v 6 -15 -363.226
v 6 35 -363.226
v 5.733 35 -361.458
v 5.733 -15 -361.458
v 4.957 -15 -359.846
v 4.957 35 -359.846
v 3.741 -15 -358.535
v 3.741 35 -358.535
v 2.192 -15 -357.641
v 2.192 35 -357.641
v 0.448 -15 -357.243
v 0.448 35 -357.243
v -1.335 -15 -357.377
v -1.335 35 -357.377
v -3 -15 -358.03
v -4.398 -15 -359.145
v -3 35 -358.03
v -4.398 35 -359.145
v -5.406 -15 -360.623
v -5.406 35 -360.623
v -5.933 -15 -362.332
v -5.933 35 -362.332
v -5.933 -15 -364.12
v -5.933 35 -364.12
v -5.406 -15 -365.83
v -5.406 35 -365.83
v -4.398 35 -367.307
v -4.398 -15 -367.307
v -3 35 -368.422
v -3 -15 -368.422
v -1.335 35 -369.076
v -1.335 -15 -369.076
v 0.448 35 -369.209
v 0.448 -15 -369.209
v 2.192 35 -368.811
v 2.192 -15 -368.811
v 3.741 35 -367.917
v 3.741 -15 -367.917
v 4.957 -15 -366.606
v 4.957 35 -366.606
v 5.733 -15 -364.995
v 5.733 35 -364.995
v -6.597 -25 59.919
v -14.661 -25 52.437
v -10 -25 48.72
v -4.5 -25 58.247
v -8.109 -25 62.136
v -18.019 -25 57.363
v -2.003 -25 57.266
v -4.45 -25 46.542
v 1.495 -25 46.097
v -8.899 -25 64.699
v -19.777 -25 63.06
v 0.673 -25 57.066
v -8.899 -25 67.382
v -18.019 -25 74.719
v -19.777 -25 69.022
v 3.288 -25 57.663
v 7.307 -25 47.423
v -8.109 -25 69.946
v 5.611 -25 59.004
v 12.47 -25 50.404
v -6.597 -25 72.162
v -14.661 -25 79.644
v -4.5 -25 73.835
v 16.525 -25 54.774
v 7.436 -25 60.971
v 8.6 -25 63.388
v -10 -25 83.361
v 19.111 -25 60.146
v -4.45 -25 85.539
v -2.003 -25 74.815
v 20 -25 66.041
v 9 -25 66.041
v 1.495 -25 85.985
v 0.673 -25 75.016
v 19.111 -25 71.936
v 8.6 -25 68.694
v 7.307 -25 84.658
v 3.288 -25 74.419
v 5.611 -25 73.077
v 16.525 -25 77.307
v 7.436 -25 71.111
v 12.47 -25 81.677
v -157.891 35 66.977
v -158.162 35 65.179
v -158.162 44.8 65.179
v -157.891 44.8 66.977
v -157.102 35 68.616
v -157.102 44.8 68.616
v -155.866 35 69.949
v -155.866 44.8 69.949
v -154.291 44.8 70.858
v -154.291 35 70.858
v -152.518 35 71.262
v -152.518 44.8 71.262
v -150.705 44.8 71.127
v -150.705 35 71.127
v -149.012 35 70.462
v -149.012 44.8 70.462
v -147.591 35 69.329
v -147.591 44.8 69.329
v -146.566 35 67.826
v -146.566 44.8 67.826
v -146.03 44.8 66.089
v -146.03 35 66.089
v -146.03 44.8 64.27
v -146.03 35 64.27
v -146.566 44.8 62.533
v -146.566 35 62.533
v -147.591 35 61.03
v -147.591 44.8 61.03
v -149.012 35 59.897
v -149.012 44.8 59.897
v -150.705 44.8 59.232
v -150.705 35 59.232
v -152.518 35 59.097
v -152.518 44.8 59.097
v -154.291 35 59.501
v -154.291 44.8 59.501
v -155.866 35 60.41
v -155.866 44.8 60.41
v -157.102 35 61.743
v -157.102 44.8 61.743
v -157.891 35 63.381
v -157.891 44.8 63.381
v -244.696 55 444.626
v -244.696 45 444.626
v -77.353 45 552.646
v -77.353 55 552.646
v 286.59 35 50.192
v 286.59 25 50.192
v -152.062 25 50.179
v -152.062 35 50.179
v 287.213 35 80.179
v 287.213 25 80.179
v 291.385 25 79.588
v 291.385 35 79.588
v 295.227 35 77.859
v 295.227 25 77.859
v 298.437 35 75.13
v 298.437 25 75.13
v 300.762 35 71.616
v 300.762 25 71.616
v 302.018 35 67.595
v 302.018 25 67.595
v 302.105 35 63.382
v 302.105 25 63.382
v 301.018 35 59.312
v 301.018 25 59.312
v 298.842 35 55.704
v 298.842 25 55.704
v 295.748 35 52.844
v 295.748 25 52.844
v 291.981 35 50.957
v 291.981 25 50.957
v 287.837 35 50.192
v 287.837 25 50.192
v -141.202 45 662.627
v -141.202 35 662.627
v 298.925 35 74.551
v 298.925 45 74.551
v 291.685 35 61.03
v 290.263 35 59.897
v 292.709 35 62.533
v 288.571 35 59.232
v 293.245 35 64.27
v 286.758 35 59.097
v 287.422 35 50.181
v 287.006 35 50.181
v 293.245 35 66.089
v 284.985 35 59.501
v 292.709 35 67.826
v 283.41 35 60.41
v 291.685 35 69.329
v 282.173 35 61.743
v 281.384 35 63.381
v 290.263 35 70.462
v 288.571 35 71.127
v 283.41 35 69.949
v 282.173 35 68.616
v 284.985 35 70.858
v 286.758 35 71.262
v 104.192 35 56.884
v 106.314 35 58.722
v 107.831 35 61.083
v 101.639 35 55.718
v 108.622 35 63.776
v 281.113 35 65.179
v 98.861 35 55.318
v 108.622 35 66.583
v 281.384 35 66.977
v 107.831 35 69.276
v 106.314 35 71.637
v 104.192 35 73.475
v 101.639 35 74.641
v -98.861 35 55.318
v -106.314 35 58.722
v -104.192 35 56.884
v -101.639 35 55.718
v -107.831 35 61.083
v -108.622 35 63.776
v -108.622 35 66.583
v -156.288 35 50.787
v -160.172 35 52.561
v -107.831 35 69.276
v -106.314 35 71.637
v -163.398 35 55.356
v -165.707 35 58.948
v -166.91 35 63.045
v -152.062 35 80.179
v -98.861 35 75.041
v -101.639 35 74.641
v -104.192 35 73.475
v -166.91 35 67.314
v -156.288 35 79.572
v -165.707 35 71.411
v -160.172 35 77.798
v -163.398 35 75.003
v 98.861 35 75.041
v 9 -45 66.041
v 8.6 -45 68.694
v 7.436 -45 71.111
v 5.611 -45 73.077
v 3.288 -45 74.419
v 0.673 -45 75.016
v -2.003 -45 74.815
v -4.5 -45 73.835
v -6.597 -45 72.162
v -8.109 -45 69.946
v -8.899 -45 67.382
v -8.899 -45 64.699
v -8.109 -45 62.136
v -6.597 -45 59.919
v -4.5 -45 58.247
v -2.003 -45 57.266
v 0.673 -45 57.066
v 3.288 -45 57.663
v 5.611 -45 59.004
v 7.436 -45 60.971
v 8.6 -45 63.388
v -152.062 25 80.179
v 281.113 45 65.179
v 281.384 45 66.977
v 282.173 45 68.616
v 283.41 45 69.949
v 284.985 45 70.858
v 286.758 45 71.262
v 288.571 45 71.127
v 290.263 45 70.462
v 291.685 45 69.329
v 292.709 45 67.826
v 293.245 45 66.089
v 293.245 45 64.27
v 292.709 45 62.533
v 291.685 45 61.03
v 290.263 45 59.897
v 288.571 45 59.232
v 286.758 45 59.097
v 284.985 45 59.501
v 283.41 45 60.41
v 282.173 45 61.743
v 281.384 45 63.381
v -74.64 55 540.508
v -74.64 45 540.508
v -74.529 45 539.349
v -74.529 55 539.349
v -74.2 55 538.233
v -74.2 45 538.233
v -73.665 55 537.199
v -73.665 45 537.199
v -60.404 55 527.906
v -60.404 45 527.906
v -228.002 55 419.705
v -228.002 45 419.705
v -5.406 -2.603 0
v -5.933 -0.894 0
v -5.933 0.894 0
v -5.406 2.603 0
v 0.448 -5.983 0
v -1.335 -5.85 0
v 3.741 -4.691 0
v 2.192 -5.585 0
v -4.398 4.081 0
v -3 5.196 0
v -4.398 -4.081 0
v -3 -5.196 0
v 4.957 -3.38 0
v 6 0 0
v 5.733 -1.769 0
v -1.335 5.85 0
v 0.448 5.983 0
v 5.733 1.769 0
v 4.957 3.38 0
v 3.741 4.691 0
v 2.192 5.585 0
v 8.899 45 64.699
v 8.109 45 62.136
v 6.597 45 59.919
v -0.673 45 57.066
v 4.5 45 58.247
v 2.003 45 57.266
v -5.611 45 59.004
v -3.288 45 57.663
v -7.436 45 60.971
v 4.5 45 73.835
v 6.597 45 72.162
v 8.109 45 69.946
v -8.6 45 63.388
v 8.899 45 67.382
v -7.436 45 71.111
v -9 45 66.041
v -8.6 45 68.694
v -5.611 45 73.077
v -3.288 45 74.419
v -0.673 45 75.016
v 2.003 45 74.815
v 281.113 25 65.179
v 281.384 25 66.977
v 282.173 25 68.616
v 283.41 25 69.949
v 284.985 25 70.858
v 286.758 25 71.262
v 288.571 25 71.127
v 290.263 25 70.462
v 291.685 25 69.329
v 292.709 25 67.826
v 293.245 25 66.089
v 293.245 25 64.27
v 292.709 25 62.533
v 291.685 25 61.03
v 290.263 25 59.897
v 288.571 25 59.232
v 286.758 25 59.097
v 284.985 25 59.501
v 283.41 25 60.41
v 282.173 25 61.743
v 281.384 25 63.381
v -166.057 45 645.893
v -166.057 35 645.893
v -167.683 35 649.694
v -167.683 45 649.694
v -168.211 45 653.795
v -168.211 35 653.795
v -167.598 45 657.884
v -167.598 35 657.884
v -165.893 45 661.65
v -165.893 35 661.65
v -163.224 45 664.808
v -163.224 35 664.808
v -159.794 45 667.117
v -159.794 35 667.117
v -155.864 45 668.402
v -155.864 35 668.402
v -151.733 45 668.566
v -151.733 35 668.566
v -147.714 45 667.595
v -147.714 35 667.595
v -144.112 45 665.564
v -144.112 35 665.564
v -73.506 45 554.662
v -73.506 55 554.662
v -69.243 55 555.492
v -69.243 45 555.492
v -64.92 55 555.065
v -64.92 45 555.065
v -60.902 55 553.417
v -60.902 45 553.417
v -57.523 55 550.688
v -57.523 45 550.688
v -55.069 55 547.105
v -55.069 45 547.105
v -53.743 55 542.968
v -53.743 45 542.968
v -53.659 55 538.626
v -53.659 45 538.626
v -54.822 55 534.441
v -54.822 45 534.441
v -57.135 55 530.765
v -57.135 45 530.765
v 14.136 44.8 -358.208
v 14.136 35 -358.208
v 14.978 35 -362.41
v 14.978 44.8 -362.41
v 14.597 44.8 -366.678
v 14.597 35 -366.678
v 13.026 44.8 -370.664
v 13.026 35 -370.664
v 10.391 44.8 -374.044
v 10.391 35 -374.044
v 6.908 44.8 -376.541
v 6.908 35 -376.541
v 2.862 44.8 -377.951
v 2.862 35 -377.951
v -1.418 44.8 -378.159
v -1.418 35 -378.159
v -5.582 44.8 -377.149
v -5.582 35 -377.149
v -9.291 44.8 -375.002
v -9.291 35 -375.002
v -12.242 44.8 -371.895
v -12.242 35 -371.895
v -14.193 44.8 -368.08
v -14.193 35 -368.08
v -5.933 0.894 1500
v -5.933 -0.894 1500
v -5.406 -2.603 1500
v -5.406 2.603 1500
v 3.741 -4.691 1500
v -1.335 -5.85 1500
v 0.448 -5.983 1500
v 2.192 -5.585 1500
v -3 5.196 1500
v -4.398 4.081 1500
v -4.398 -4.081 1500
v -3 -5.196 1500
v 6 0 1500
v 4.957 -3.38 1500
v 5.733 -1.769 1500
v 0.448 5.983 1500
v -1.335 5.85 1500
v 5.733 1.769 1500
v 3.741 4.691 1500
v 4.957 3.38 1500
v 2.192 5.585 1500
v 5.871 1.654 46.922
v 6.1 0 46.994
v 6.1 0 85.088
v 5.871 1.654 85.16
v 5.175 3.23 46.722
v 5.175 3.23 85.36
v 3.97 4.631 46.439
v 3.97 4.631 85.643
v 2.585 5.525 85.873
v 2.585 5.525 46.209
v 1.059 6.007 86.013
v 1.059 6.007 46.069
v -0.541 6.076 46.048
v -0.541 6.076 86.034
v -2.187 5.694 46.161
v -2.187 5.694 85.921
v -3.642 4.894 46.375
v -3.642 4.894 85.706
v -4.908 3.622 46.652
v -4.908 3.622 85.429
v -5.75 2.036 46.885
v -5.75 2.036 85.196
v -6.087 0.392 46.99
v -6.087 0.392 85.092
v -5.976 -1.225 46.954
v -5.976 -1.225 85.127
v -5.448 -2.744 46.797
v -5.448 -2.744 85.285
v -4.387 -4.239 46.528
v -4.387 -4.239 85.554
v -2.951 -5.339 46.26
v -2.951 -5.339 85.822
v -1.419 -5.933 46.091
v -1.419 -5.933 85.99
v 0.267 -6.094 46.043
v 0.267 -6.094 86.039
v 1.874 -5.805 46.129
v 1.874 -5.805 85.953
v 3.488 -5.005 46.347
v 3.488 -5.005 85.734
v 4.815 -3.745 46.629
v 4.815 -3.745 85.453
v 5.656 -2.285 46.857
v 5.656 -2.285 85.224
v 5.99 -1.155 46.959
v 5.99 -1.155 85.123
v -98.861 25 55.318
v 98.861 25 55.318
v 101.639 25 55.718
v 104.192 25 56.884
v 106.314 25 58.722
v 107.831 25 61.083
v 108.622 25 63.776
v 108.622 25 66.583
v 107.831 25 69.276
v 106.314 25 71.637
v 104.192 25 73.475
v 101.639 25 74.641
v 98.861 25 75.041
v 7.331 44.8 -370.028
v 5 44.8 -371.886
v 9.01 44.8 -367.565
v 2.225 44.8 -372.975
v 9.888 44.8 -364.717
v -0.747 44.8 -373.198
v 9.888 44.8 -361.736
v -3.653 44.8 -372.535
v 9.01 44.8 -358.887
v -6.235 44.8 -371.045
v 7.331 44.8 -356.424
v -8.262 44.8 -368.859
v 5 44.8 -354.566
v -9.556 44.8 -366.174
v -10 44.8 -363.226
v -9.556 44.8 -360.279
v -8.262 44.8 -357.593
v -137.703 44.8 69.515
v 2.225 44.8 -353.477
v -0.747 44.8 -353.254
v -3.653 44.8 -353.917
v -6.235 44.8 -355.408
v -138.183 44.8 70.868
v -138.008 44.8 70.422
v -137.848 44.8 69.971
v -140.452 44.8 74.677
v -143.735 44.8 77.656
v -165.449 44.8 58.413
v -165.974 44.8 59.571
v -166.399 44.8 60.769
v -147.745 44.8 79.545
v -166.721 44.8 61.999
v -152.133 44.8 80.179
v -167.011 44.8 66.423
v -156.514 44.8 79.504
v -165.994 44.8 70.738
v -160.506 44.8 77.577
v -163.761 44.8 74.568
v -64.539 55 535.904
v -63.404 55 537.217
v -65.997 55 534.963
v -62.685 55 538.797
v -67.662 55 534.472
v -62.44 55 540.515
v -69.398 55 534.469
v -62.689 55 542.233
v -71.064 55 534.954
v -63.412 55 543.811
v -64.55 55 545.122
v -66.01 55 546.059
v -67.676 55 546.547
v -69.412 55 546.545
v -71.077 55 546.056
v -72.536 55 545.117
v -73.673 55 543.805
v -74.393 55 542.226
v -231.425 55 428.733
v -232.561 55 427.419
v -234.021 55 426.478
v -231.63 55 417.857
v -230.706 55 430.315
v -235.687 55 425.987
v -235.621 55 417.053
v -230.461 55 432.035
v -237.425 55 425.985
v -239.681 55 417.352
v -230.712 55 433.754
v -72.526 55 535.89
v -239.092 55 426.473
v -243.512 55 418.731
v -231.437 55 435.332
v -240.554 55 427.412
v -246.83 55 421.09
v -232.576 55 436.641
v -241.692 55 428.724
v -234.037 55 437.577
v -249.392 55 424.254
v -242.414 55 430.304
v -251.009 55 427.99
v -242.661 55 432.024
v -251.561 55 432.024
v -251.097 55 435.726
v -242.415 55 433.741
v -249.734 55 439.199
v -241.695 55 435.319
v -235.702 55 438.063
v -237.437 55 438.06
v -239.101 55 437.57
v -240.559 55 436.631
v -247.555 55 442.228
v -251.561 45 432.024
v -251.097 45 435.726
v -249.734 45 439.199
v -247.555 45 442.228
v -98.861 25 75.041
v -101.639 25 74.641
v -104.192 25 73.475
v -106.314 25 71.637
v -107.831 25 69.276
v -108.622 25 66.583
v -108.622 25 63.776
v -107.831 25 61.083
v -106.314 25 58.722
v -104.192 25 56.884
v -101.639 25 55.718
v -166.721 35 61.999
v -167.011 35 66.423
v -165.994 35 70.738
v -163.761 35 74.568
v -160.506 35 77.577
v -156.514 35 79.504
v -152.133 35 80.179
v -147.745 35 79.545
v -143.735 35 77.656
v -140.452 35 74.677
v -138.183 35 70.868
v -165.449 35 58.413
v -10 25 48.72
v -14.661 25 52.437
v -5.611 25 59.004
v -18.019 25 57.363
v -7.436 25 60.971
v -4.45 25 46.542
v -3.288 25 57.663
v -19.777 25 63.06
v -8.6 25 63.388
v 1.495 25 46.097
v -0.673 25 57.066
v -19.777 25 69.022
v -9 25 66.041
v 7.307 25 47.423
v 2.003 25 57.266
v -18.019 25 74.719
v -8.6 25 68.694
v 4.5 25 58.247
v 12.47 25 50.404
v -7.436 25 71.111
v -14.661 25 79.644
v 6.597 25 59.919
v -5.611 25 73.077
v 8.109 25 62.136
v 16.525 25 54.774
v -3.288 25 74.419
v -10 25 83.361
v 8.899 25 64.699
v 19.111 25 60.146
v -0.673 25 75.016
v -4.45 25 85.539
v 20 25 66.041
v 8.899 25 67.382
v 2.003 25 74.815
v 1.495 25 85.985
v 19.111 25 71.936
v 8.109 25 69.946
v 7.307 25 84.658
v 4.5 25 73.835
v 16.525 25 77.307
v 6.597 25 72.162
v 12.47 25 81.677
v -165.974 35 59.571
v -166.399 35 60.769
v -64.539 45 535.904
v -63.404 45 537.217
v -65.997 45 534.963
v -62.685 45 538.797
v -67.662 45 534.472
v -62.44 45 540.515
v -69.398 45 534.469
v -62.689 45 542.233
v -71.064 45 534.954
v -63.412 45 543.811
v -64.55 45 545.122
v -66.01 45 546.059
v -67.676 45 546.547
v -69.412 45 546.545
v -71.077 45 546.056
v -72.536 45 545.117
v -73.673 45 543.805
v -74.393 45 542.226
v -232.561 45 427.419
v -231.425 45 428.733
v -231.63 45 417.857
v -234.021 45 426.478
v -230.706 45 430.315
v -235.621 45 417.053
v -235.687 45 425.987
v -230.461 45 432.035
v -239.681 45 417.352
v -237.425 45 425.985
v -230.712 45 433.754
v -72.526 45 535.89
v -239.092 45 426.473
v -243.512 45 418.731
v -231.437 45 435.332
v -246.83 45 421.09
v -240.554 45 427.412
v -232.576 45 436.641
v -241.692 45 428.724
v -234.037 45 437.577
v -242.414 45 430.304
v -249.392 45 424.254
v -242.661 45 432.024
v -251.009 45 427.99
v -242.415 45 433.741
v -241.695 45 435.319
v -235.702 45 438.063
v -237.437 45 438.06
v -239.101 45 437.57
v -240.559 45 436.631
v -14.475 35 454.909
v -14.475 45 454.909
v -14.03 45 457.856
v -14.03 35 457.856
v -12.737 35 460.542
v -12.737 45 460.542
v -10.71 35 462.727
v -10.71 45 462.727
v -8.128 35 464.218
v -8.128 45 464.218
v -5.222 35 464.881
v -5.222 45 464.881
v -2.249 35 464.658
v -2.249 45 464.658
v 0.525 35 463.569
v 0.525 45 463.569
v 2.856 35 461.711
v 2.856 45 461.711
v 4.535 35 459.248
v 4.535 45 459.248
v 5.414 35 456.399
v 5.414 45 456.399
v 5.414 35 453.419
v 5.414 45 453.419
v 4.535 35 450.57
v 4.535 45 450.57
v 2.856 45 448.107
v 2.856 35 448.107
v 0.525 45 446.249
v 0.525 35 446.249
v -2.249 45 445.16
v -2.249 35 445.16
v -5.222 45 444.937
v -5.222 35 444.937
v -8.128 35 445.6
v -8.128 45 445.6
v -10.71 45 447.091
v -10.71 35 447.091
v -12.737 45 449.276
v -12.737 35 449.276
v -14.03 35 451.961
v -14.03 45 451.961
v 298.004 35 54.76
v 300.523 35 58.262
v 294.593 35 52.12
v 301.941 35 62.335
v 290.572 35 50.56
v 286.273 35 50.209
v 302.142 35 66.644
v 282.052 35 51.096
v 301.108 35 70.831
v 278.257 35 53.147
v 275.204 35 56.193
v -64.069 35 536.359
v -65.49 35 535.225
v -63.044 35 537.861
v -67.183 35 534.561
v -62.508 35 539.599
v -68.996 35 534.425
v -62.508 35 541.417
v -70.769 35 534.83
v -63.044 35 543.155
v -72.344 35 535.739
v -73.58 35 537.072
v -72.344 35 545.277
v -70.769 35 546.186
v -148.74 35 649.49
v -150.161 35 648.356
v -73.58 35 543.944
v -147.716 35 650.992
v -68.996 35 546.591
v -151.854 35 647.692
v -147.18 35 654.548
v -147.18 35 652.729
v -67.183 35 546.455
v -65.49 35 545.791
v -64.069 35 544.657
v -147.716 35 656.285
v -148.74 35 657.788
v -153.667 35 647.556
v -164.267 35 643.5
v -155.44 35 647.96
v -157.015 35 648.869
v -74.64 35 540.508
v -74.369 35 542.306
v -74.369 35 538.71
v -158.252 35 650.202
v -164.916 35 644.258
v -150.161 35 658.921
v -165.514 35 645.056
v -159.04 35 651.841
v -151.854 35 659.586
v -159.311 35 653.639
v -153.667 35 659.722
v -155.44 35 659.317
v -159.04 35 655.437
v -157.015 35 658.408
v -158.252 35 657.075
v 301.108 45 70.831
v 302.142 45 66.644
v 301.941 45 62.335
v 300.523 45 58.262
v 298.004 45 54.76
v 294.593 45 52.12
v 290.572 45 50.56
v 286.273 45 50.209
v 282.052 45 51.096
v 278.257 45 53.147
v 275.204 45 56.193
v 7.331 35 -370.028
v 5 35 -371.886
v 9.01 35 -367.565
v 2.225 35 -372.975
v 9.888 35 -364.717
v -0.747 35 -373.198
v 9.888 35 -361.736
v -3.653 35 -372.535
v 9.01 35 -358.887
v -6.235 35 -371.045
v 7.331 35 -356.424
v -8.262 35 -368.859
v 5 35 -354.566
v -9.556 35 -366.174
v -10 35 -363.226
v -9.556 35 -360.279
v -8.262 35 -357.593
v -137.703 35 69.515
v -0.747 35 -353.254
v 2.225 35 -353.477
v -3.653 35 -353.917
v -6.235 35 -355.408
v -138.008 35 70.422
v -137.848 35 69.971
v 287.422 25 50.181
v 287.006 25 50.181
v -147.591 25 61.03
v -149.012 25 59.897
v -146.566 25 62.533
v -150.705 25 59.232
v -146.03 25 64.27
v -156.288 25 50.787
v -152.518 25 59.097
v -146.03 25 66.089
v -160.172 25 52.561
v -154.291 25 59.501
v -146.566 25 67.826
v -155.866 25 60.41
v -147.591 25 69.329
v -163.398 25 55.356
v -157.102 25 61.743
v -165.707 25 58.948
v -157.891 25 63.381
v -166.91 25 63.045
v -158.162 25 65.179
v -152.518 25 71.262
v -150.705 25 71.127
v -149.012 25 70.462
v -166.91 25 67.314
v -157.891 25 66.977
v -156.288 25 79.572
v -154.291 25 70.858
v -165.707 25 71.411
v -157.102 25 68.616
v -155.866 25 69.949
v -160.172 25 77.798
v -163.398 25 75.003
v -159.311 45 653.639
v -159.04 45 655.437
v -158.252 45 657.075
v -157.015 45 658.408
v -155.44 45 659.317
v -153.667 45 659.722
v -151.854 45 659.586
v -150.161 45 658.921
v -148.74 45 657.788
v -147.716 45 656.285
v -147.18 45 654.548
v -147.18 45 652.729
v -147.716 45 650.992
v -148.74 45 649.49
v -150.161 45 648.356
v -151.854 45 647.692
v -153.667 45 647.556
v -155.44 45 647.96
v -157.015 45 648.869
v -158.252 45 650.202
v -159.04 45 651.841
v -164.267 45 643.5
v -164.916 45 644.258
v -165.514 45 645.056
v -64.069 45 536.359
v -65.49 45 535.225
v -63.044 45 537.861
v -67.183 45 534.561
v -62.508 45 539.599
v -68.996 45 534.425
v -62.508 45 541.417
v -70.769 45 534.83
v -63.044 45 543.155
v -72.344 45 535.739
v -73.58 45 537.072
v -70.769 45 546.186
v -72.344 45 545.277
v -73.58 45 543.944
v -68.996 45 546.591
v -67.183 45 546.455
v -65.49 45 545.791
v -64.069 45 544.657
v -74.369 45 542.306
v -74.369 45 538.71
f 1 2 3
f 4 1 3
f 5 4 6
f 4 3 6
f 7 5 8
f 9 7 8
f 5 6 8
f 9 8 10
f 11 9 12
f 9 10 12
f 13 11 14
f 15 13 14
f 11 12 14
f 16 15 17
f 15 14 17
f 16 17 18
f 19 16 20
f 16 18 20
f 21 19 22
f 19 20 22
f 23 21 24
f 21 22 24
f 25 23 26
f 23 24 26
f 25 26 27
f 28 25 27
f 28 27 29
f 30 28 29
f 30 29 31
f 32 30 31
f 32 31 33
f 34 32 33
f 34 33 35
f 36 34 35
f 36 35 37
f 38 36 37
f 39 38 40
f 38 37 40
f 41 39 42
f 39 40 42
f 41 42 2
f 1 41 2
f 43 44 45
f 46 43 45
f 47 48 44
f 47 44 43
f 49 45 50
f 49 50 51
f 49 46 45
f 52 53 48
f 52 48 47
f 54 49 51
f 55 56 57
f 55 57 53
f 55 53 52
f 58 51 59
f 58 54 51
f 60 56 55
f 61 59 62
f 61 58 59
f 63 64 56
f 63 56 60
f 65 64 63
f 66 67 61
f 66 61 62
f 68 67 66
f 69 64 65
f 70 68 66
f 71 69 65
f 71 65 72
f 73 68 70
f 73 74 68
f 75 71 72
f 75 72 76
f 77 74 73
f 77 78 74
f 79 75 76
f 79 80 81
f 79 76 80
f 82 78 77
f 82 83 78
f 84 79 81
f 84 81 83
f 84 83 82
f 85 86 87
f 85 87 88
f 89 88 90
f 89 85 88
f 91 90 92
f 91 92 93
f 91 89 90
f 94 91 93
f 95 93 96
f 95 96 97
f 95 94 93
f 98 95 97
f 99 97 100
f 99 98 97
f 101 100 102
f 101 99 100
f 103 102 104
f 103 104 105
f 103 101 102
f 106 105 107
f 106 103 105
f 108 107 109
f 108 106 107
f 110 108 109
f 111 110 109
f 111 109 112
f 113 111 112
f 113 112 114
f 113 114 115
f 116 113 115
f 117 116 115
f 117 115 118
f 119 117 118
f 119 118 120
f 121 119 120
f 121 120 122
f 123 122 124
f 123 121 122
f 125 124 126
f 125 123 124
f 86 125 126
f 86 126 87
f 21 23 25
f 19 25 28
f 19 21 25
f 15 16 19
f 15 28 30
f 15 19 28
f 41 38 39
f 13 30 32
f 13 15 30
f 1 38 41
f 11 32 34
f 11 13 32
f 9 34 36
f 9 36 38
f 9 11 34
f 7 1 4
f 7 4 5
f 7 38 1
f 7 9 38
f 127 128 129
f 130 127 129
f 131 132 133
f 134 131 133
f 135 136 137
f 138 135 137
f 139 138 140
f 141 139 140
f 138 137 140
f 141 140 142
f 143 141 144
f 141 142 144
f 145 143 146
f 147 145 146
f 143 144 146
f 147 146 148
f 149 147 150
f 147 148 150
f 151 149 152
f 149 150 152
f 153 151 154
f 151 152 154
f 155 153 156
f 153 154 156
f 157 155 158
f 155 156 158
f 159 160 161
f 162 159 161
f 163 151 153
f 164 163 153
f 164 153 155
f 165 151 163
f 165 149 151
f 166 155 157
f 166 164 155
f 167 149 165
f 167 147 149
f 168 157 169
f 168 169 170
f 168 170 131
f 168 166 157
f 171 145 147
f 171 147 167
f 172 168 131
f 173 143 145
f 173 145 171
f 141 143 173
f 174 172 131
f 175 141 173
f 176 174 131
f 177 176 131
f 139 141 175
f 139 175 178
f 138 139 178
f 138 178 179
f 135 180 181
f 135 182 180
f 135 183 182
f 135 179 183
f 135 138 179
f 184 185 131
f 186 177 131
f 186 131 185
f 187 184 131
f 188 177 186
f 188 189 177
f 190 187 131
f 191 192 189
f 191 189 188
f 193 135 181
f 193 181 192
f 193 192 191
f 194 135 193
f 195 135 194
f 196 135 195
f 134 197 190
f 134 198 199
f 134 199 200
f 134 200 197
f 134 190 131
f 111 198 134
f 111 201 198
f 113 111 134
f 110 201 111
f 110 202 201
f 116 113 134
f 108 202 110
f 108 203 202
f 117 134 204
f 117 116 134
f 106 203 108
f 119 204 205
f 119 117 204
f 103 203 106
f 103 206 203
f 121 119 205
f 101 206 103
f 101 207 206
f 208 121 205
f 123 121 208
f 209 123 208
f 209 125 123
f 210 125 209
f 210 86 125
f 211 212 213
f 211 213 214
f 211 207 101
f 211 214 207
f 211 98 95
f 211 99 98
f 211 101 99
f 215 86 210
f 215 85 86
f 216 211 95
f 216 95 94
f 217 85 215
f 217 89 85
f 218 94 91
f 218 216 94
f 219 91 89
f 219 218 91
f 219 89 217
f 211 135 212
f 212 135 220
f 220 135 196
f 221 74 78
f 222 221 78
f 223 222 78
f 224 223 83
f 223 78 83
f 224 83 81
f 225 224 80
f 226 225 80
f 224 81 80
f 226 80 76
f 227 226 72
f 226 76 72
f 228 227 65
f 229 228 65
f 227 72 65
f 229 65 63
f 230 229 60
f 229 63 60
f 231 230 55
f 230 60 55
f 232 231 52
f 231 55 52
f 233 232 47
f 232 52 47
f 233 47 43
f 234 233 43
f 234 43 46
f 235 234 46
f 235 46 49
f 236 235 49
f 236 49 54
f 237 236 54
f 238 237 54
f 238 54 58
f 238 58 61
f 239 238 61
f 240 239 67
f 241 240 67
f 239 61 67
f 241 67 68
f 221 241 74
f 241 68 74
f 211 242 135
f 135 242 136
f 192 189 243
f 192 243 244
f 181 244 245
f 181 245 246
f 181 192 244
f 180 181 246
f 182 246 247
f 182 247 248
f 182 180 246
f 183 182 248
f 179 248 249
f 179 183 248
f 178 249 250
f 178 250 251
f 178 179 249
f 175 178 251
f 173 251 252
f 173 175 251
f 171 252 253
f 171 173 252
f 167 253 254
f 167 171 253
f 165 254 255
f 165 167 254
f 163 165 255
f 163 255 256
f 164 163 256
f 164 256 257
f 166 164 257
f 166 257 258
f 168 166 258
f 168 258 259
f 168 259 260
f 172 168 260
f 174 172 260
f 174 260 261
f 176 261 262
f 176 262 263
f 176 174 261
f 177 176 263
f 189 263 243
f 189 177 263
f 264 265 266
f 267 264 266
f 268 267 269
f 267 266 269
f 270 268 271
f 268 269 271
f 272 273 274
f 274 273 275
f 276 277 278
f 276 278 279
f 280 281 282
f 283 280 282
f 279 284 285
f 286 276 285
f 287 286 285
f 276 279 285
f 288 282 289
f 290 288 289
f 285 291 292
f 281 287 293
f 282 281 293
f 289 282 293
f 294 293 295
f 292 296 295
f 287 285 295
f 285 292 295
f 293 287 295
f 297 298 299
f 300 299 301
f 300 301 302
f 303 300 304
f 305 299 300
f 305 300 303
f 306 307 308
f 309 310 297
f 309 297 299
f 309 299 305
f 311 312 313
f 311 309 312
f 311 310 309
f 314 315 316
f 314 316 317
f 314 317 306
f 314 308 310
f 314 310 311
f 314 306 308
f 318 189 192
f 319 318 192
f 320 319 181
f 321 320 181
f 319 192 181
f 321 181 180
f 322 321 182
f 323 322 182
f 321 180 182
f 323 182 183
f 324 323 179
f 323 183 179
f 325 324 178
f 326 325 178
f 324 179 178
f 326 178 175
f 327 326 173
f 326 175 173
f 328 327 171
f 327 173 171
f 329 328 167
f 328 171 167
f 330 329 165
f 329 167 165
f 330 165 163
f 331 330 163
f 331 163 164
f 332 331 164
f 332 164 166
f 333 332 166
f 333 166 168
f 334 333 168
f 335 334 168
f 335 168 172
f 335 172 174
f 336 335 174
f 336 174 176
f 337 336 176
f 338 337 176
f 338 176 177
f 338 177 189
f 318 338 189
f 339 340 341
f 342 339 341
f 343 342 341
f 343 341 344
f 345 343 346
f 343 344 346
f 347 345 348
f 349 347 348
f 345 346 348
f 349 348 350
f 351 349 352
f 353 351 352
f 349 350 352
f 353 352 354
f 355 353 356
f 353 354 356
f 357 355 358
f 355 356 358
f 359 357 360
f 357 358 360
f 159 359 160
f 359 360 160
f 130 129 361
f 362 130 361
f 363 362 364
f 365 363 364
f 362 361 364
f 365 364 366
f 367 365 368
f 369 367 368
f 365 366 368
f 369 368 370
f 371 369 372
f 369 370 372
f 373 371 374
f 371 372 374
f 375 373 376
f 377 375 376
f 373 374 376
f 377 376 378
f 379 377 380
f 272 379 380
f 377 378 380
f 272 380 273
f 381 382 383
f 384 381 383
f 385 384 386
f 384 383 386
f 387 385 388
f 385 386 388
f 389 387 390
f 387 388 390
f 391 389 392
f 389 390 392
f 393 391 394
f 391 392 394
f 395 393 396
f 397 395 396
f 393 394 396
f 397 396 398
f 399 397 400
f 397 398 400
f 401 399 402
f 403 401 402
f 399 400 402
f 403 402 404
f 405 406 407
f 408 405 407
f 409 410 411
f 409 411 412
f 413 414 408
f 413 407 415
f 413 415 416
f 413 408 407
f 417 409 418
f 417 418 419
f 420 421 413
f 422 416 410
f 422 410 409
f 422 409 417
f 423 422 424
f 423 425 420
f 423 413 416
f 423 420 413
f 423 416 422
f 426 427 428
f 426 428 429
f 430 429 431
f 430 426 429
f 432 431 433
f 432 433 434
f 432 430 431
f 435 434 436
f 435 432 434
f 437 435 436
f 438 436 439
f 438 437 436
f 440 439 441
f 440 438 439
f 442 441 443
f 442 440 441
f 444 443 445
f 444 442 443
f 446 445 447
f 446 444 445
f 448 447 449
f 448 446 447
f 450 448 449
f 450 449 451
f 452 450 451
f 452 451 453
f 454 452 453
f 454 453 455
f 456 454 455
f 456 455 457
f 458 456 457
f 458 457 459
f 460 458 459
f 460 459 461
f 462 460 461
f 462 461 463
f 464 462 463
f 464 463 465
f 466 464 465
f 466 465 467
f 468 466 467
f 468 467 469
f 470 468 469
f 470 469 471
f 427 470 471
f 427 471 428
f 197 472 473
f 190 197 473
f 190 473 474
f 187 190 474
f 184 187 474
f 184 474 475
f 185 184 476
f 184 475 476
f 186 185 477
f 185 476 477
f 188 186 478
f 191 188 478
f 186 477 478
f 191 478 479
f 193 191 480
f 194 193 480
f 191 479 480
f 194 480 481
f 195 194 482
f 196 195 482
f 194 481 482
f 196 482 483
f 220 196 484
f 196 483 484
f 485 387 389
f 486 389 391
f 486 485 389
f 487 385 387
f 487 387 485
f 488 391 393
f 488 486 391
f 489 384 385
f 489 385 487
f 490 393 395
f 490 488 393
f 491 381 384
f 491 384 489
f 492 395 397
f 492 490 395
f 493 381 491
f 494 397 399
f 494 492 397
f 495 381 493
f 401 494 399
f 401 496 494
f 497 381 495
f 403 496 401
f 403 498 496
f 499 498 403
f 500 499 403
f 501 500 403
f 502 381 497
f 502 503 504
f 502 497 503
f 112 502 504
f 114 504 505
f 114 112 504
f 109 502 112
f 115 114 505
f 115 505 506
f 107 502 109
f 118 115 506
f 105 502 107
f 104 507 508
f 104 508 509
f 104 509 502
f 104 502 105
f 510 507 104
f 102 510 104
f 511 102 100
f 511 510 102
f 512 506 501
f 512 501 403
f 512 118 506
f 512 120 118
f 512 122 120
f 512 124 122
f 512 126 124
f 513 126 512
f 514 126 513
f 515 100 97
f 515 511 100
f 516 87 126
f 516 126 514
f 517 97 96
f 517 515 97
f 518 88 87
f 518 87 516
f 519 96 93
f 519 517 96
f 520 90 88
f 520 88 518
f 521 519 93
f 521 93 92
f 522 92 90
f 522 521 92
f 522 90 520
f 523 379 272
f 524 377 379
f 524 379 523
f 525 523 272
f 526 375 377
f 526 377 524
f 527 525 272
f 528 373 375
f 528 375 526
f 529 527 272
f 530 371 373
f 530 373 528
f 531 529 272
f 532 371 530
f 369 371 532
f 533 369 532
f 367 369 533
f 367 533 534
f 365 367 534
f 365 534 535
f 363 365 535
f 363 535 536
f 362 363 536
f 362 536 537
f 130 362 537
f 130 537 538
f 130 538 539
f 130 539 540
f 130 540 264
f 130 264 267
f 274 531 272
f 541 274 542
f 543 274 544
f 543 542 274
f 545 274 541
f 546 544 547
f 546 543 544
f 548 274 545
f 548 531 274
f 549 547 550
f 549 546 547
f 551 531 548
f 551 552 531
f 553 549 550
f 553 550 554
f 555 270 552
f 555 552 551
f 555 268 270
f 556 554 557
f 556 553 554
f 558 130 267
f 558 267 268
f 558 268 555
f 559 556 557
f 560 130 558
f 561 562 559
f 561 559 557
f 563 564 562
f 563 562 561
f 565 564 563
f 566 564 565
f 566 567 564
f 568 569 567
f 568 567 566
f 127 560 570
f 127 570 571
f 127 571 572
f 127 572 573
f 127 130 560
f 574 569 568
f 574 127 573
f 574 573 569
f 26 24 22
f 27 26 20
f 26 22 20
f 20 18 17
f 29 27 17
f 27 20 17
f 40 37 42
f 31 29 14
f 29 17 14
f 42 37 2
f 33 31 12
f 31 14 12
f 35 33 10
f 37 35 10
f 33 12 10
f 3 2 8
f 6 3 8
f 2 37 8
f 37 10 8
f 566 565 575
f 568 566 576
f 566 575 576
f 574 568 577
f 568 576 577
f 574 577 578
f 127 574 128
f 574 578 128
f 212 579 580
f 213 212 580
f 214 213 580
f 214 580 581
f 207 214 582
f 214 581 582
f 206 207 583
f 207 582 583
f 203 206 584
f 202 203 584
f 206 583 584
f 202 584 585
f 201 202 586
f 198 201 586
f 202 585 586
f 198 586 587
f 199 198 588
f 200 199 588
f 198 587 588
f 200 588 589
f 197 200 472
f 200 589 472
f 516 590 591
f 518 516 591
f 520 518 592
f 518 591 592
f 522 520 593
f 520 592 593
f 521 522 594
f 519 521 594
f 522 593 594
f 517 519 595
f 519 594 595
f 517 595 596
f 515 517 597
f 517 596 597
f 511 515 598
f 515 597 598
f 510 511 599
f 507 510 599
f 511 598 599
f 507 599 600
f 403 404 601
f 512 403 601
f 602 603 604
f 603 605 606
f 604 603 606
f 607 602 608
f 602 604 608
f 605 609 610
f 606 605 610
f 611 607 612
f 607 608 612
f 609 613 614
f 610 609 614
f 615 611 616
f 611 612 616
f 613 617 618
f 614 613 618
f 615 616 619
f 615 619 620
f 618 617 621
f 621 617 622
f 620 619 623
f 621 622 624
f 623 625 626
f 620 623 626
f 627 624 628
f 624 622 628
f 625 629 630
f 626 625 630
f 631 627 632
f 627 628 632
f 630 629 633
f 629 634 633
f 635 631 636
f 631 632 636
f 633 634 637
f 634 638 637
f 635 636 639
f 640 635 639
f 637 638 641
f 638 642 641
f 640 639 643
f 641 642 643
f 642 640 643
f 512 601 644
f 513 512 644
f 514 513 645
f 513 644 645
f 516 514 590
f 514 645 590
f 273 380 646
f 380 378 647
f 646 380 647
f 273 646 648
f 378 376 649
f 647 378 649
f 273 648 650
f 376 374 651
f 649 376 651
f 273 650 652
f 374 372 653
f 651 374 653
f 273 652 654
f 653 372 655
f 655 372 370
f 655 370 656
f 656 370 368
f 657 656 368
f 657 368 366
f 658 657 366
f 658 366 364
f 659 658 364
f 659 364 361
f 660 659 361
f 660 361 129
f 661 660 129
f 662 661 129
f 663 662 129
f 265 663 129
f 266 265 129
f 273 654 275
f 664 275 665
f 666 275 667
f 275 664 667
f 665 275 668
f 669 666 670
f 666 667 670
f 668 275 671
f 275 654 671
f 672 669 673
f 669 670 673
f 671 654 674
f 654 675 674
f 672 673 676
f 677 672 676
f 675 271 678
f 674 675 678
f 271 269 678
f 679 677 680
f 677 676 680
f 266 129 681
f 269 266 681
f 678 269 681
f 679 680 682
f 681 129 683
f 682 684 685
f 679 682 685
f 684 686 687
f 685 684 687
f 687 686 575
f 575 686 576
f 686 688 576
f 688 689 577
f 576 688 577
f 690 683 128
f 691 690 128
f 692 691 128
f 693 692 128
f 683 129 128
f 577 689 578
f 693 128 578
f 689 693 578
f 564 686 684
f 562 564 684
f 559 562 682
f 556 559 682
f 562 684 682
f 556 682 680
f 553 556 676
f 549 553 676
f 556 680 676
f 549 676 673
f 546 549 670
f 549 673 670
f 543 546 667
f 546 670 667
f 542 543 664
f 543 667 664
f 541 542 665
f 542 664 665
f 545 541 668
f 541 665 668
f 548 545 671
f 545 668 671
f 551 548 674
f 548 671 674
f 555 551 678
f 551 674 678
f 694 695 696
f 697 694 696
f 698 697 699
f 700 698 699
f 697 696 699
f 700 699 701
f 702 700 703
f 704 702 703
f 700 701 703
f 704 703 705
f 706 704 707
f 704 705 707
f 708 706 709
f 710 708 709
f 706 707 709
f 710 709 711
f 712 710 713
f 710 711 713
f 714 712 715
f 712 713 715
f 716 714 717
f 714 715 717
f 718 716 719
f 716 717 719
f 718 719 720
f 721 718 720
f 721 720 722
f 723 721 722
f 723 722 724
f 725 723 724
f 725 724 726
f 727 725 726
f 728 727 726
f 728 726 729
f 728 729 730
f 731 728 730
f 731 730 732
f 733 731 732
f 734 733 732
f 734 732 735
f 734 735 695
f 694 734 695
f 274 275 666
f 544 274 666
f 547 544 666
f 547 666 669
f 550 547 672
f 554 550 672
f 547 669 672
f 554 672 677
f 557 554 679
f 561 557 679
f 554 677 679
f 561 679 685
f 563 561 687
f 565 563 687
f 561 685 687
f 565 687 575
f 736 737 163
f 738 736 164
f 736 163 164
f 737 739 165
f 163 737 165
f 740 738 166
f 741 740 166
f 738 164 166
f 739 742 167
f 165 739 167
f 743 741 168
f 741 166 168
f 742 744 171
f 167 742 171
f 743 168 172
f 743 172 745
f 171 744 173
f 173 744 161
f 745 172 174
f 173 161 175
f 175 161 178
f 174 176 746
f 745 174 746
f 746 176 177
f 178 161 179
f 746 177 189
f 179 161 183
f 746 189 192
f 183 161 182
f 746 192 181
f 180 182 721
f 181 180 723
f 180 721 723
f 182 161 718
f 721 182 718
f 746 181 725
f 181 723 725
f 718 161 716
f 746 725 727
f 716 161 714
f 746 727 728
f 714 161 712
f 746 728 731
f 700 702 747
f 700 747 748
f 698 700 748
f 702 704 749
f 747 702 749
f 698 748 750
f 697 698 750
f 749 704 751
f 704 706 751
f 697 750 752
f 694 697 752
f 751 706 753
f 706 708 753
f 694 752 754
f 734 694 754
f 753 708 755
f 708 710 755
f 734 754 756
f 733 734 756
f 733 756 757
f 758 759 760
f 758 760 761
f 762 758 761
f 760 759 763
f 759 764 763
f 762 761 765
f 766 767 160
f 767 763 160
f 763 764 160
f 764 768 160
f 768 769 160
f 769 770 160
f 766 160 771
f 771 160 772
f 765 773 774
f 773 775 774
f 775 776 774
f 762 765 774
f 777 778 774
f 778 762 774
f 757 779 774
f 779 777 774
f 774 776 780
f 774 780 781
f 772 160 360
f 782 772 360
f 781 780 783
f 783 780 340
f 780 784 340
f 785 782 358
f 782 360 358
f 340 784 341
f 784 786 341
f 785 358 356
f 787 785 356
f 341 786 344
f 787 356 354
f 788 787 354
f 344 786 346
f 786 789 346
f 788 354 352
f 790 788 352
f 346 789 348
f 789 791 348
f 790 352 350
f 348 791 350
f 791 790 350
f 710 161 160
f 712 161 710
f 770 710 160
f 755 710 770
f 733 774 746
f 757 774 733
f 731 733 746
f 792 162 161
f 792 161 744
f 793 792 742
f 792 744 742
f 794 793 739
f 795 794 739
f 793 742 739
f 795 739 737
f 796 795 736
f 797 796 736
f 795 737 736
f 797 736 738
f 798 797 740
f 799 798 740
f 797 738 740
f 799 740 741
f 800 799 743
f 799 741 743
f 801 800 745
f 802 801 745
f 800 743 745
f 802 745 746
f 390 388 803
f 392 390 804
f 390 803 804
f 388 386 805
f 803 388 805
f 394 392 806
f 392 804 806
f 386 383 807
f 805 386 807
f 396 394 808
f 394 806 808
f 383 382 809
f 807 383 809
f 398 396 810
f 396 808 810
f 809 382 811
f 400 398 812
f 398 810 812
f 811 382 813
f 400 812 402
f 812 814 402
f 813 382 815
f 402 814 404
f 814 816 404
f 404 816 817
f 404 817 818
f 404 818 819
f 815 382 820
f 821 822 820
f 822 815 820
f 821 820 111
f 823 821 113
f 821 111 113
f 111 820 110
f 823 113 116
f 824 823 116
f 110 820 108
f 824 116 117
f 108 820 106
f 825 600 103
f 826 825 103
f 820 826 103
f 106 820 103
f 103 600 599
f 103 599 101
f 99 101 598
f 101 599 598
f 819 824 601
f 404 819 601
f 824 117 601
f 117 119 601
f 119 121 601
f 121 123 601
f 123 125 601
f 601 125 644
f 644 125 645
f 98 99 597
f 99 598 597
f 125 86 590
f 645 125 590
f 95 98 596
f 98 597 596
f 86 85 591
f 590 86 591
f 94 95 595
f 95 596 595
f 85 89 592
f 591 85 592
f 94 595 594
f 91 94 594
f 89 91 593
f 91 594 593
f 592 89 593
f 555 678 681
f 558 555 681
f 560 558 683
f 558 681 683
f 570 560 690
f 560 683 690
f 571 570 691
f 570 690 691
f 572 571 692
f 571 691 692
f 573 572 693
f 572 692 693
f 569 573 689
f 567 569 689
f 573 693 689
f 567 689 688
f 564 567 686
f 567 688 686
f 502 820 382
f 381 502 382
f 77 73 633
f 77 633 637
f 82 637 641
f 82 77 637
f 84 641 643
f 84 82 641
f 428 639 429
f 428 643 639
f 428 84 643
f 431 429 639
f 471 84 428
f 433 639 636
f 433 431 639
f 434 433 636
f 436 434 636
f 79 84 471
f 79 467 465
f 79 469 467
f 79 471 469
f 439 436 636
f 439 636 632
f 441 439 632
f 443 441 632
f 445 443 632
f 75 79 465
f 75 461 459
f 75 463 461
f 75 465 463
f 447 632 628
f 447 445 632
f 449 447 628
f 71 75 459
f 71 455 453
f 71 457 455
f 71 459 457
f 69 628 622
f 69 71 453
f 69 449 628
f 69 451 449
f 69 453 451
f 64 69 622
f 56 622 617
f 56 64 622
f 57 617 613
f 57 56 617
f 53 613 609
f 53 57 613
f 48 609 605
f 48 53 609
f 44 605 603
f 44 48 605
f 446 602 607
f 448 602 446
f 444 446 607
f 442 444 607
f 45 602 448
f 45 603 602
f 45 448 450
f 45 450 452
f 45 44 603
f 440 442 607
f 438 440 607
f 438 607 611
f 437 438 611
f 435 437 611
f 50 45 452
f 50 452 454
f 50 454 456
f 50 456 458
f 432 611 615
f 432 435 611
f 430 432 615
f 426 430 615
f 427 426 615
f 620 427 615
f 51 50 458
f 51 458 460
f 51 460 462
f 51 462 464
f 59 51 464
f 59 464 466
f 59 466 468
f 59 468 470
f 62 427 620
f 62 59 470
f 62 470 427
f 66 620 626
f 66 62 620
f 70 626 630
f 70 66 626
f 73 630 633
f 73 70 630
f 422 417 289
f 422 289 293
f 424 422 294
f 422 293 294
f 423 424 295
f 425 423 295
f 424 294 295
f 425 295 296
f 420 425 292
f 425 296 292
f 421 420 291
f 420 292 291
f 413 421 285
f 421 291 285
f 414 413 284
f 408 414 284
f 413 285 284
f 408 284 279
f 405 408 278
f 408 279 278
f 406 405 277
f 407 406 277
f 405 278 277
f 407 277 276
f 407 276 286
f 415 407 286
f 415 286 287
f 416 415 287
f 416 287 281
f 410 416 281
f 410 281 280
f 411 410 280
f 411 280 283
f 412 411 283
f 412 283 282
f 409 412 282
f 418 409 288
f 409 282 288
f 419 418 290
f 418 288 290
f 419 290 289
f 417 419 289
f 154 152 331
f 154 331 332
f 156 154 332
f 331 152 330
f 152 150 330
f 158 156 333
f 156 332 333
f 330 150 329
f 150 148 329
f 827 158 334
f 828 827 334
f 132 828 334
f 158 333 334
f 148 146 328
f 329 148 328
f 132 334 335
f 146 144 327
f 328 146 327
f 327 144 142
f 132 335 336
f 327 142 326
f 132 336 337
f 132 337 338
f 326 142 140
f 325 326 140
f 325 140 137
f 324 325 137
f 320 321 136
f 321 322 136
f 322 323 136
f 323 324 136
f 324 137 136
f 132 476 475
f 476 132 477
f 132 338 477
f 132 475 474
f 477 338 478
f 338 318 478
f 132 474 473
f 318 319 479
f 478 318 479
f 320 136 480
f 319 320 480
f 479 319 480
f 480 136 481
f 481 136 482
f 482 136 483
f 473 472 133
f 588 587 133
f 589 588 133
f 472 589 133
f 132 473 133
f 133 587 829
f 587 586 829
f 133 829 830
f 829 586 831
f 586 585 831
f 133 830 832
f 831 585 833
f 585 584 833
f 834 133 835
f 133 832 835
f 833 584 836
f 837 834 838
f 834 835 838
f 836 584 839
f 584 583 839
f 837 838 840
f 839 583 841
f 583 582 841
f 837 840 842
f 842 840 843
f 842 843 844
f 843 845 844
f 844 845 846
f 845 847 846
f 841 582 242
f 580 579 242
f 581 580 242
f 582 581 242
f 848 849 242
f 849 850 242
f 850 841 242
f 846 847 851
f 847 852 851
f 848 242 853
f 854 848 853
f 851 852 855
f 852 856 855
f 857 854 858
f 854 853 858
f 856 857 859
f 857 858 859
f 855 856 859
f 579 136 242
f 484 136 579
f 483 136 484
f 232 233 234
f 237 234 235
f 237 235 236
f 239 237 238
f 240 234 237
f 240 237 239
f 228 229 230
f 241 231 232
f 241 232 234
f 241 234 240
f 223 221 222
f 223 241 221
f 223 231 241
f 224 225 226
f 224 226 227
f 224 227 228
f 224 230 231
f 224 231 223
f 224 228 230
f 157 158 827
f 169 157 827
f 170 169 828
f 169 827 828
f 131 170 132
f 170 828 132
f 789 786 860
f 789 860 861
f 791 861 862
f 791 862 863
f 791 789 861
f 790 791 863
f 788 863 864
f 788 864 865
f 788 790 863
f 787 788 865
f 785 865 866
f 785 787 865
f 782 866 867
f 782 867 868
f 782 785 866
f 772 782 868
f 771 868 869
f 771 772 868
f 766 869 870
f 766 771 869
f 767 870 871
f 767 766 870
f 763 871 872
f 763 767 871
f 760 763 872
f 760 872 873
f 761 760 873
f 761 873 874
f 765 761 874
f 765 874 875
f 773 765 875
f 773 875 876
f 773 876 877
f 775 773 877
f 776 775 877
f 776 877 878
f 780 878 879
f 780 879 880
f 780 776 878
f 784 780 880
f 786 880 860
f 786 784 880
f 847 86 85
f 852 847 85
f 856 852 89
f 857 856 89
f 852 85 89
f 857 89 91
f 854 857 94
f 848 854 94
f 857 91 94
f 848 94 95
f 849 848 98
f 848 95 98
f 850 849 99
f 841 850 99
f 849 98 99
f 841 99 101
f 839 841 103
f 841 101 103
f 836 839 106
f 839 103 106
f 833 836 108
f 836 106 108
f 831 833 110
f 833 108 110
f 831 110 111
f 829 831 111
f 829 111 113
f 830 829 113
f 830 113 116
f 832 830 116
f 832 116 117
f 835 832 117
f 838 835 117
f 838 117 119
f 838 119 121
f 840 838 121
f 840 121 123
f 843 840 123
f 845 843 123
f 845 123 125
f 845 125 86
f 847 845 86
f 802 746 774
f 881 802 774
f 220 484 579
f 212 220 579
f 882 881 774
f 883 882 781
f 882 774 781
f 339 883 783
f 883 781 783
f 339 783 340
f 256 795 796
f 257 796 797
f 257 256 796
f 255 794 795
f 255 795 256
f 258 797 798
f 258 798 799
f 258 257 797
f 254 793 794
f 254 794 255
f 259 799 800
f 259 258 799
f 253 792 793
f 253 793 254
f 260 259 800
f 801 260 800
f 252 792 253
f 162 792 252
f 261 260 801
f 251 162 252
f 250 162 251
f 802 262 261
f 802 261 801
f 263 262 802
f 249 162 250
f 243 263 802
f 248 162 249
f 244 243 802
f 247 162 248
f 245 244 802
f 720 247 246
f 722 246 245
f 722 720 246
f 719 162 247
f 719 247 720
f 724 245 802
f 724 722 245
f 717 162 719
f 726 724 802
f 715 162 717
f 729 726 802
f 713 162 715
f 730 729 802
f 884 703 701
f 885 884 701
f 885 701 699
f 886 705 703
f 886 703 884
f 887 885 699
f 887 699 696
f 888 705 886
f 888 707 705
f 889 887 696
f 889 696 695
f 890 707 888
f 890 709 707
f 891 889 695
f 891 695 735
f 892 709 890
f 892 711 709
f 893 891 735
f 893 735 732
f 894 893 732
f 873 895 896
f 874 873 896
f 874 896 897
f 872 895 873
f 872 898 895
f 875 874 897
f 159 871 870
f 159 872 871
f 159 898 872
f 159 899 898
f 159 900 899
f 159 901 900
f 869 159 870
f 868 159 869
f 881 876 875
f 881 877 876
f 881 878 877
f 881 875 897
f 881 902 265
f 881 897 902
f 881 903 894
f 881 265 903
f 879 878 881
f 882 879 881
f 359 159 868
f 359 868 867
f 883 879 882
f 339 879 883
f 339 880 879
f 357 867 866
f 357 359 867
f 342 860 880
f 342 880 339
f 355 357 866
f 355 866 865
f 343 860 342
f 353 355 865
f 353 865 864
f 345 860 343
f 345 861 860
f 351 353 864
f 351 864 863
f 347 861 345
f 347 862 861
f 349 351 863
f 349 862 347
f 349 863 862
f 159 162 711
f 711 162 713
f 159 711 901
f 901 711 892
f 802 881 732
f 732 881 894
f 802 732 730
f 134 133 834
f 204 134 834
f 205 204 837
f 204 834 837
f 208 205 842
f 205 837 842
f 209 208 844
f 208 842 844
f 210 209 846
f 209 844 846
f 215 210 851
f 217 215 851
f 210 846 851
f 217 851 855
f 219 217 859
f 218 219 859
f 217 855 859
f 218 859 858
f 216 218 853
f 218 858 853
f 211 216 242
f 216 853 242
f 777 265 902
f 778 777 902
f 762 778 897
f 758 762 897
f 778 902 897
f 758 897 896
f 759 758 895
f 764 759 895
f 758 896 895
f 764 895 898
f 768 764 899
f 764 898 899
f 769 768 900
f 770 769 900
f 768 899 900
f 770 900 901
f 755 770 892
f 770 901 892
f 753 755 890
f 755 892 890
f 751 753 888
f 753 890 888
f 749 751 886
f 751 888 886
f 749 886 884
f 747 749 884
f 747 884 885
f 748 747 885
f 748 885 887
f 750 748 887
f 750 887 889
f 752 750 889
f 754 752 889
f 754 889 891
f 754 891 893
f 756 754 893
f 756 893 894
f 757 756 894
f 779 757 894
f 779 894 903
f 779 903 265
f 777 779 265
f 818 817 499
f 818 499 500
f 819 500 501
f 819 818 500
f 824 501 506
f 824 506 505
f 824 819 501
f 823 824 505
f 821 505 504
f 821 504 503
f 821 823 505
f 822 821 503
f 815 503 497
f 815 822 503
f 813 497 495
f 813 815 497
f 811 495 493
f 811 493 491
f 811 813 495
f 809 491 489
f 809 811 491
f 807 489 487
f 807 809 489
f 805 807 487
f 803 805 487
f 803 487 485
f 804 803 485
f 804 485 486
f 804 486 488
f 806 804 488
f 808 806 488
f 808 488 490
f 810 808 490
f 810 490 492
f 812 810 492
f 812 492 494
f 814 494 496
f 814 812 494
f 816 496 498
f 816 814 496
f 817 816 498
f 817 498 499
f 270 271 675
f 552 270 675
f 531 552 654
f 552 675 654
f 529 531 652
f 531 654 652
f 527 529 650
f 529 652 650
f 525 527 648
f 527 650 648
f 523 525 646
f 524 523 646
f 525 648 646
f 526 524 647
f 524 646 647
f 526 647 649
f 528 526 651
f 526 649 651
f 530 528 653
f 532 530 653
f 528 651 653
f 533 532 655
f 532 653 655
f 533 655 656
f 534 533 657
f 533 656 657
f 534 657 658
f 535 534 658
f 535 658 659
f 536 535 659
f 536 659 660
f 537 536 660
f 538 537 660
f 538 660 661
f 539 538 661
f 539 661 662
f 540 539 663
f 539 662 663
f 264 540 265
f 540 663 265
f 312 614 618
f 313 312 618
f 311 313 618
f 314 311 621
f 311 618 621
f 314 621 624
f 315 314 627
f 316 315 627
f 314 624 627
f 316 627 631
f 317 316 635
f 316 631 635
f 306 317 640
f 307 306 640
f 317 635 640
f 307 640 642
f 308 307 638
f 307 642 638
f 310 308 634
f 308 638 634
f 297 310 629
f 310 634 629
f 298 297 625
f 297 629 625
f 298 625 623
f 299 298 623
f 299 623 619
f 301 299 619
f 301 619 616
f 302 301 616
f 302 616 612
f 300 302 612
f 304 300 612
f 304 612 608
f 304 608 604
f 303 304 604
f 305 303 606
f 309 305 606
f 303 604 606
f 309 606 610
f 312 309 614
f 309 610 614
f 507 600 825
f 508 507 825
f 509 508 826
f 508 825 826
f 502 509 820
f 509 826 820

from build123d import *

# Parameters (mm, degrees)
F0_R          = 6
F1_DEPTH      = 1500
F2_R          = 20
F3_DEPTH      = 25
F3_DEPTH_BACK = 25
F4_R          = 9
F5_DEPTH      = 20
F6_R          = 9
F7_DEPTH      = 20
F8_R          = 6.1
F9_DEPTH      = 100
F11_DEPTH     = 10
F12_R         = 6.1
F13_DEPTH     = 25
F14_R         = 6.1
F15_DEPTH     = 25
F16_R         = 6.1
F17_DEPTH     = 10
F18_R         = 10
F18_R_2       = 6.1
F19_DEPTH     = 9.8
F20_R         = 10
F21_DEPTH     = 25
F22_R         = 6.1
F23_DEPTH     = 25
F25_DEPTH     = 10
F26_R         = 6
F27_DEPTH     = 50


with BuildPart() as f1:
    # F0 (on Top) → F1 (new body)
    with BuildSketch(Plane.XY):
        Circle(F0_R)
    extrude(amount=F1_DEPTH)


with BuildPart() as f3:
    # F2 (on Front) → F3 (new body, two sides)
    with BuildSketch(Plane.XZ) as f3_sk:
        with Locations((0, 66.0408288468)):
            Circle(F2_R)
    extrude(amount=F3_DEPTH)
    extrude(f3_sk.sketch, amount=-F3_DEPTH_BACK)

    # F4 (on face) → F5 (join)
    with BuildSketch(Plane.XZ.offset(25)):
        with Locations((0, 66.0408288468)):
            Circle(F4_R)
    extrude(amount=F5_DEPTH)

    # F6 (on face) → F7 (join)
    with BuildSketch(Plane(origin=(0, 25, 0), x_dir=(-1, 0, 0), z_dir=(0, 1, 0))):
        with Locations((0, 66.0408288468)):
            Circle(F6_R)
    extrude(amount=F7_DEPTH)

    # F8 (on Top) → F9 (cut)
    with BuildSketch(Plane.XY):
        Circle(F8_R)
    extrude(amount=F9_DEPTH, mode=Mode.SUBTRACT)


with BuildPart() as f11:
    # F10 (on face) → F11 (new body)
    with BuildSketch(Plane(origin=(0, 25, 0), x_dir=(-1, 0, 0), z_dir=(0, 1, 0))):
        with BuildLine():
            Line((152.0618690442, 80.1794555013), (-287.2134447098, 80.1794555079))
            ThreePointArc((-287.2134447098, 80.1794555079), (-302.210198455, 65.4915085567), (-287.8374157402, 50.1924391219))
            Line((-287.8374157402, 50.1924391219), (-286.5903583626, 50.192402315))
            Line((-286.5903583626, 50.192402315), (152.0618690442, 50.1794555144))
            Line((152.0618690442, 50.1794555144), (152.0618690442, 80.1794555013))
        make_face()
        with BuildLine():
            ThreePointArc((-98.8607928157, 55.3180821689), (-108.7221661547, 65.1794555079), (-98.8607928157, 75.0408288468))
            Line((-98.8607928157, 75.0408288468), (98.8607928157, 75.0408288468))
            ThreePointArc((98.8607928157, 75.0408288468), (108.7221661547, 65.1794555079), (98.8607928157, 55.3180821689))
            Line((98.8607928157, 55.3180821689), (-98.8607928157, 55.3180821689))
        make_face(mode=Mode.SUBTRACT)
        with BuildLine():
            Line((-286.5903583626, 50.192402315), (-287.8374157402, 50.1924391219))
            ThreePointArc((-287.8374157402, 50.1924391219), (-287.2138874341, 50.1794555144), (-286.5903583626, 50.192402315))
        make_face()
        with BuildLine():
            ThreePointArc((152.0618690442, 50.1794555144), (167.0623117685, 65.1794555079), (152.0618690442, 80.1794555013))
            Line((152.0618690442, 80.1794555013), (152.0618690442, 50.1794555144))
        make_face()
    extrude(amount=F11_DEPTH)

    # F12 (on face) → F13 (cut)
    with BuildSketch(Plane(origin=(0, 35, 0), x_dir=(-1, 0, 0), z_dir=(0, 1, 0))):
        with Locations((-287.2134447098, 65.1794555079)):
            Circle(F12_R)
    extrude(amount=-F13_DEPTH, mode=Mode.SUBTRACT)

    # F14 (on face) → F15 (cut)
    with BuildSketch(Plane(origin=(0, 35, 0), x_dir=(-1, 0, 0), z_dir=(0, 1, 0))):
        with Locations((152.0623117685, 65.1794555079)):
            Circle(F14_R)
    extrude(amount=-F15_DEPTH, mode=Mode.SUBTRACT)


with BuildPart() as f17:
    # F16 (on face) → F17 (new body)
    with BuildSketch(Plane(origin=(0, 35, 0), x_dir=(-1, 0, 0), z_dir=(0, 1, 0))):
        with BuildLine():
            Line((141.2023478455, 662.6265148895), (-298.9252010995, 74.5514756885))
            ThreePointArc((-298.9252010995, 74.5514756885), (-296.3940489054, 53.3170566525), (-275.2035315421, 56.1926882524))
            Line((-275.2035315421, 56.1926882524), (164.2665588229, 643.5003902394))
            Line((164.2665588229, 643.5003902394), (166.0567209766, 645.8927624252))
            ThreePointArc((166.0567209766, 645.8927624252), (161.588760798, 666.0813494708), (141.2023478455, 662.6265148895))
        make_face()
        with Locations((-287.2134447098, 65.1794555079)):
            Circle(F16_R, mode=Mode.SUBTRACT)
        with Locations((153.2114452098, 653.6386574978)):
            Circle(F16_R, mode=Mode.SUBTRACT)
        with BuildLine():
            Line((166.0567209766, 645.8927624252), (164.2665588229, 643.5003902394))
            ThreePointArc((164.2665588229, 643.5003902394), (165.2213583775, 644.6518902423), (166.0567209766, 645.8927624252))
        make_face()
    extrude(amount=F17_DEPTH)

    # F20 (on face) → F21 (cut)
    with BuildSketch(Plane(origin=(0, 45, 0), x_dir=(-1, 0, 0), z_dir=(0, 1, 0))):
        with Locations((4.4746835584, 454.9089351973)):
            Circle(F20_R)
    extrude(amount=-F21_DEPTH, mode=Mode.SUBTRACT)

    # F22 (on face) → F23 (cut)
    with BuildSketch(Plane(origin=(0, 45, 0), x_dir=(-1, 0, 0), z_dir=(0, 1, 0))):
        with Locations((68.5402597264, 540.5080434442)):
            Circle(F22_R)
    extrude(amount=-F23_DEPTH, mode=Mode.SUBTRACT)


with BuildPart() as f19:
    # F18 (on face) → F19 (new body)
    with BuildSketch(Plane(origin=(0, 35, 0), x_dir=(-1, 0, 0), z_dir=(0, 1, 0))):
        with BuildLine():
            Line((137.7026486797, 69.5153609467), (-14.1357335289, -358.208134007))
            ThreePointArc((-14.1357335289, -358.208134007), (-4.9357863724, -377.3908799351), (14.1931371418, -368.0795398482))
            Line((14.1931371418, -368.0795398482), (165.4493665169, 58.4128636653))
            Line((165.4493665169, 58.4128636653), (166.7213560809, 61.9994523872))
            ThreePointArc((166.7213560809, 61.9994523872), (156.513784022, 79.5037144687), (138.1828939866, 70.8681954417))
            Line((138.1828939866, 70.8681954417), (137.7026486797, 69.5153609467))
        make_face()
        with Locations((0, -363.2262051106)):
            Circle(F18_R, mode=Mode.SUBTRACT)
        with Locations((152.0623117685, 65.1794555079)):
            Circle(F18_R_2, mode=Mode.SUBTRACT)
        with BuildLine():
            ThreePointArc((138.1828939866, 70.8681954417), (137.9265782397, 70.1975266114), (137.7026486797, 69.5153609467))
            Line((137.7026486797, 69.5153609467), (138.1828939866, 70.8681954417))
        make_face()
        with BuildLine():
            Line((166.7213560809, 61.9994523872), (165.4493665169, 58.4128636653))
            ThreePointArc((165.4493665169, 58.4128636653), (166.1995612463, 60.1656568279), (166.7213560809, 61.9994523872))
        make_face()
    extrude(amount=F19_DEPTH)


with BuildPart() as f25:
    # F24 (on face) → F25 (new body)
    with BuildSketch(Plane(origin=(0, 45, 0), x_dir=(-1, 0, 0), z_dir=(0, 1, 0))):
        with BuildLine():
            ThreePointArc((81.1418503879, 532.37171056), (82.9281688852, 536.2668089495), (83.5402597264, 540.5080434442))
            ThreePointArc((83.5402597264, 540.5080434442), (81.9041987858, 547.320174742), (77.3529086839, 552.6462977813))
            ThreePointArc((77.3529086839, 552.6462977813), (56.1655326255, 548.9854327343), (60.4044718845, 527.9061008879))
            ThreePointArc((60.4044718845, 527.9061008879), (71.6979908964, 525.8441853619), (81.1418503879, 532.37171056))
        make_face()
        with BuildLine():
            ThreePointArc((74.6402597264, 540.5080434442), (74.3913427843, 538.7832747497), (73.6649065954, 537.1992680713))
            ThreePointArc((73.6649065954, 537.1992680713), (62.6891766685, 542.2328121387), (74.6402597264, 540.5080434442))
        make_face(mode=Mode.SUBTRACT)
        with BuildLine():
            ThreePointArc((77.3529086839, 552.6462977813), (81.9041987858, 547.320174742), (83.5402597264, 540.5080434442))
            ThreePointArc((83.5402597264, 540.5080434442), (82.9281688852, 536.2668089495), (81.1418503879, 532.37171056))
            Line((81.1418503879, 532.37171056), (223.9598778841, 440.1599378729))
            ThreePointArc((223.9598778841, 440.1599378729), (233.4032298314, 446.6873537668), (244.69638401, 444.6261107073))
            Line((244.69638401, 444.6261107073), (77.3529086839, 552.6462977813))
        make_face()
        with BuildLine():
            Line((223.9598778841, 440.1599378729), (81.1418503879, 532.37171056))
            ThreePointArc((81.1418503879, 532.37171056), (71.6979908964, 525.8441853619), (60.4044718845, 527.9061008879))
            Line((60.4044718845, 527.9061008879), (228.0024563935, 419.7051914959))
            ThreePointArc((228.0024563935, 419.7051914959), (221.8461044591, 429.1153306197), (223.9598778841, 440.1599378729))
        make_face()
        with BuildLine():
            ThreePointArc((251.5614685455, 432.0236049888), (249.7338588367, 439.1991282461), (244.69638401, 444.6261107073))
            ThreePointArc((244.69638401, 444.6261107073), (233.4032298314, 446.6873537668), (223.9598778841, 440.1599378729))
            ThreePointArc((223.9598778841, 440.1599378729), (221.8461044591, 429.1153306197), (228.0024563935, 419.7051914959))
            ThreePointArc((228.0024563935, 419.7051914959), (243.5118216919, 418.7310284462), (251.5614685455, 432.0236049888))
        make_face()
        with BuildLine():
            ThreePointArc((242.6614685455, 432.0236049888), (234.836699851, 426.1725219309), (231.4368216765, 435.3323803617))
            ThreePointArc((231.4368216765, 435.3323803617), (238.28623724, 437.8746880467), (242.6614685455, 432.0236049888))
        make_face(mode=Mode.SUBTRACT)
    extrude(amount=F25_DEPTH)


with BuildPart() as f27:
    # F26 (on face) → F27 (new body)
    with BuildSketch(Plane.XZ.offset(-35)):
        with Locations((0, -363.2262051106)):
            Circle(F26_R)
    extrude(amount=F27_DEPTH)


solid = Compound([f1.part, f3.part, f11.part, f17.part, f19.part, f25.part, f27.part])
